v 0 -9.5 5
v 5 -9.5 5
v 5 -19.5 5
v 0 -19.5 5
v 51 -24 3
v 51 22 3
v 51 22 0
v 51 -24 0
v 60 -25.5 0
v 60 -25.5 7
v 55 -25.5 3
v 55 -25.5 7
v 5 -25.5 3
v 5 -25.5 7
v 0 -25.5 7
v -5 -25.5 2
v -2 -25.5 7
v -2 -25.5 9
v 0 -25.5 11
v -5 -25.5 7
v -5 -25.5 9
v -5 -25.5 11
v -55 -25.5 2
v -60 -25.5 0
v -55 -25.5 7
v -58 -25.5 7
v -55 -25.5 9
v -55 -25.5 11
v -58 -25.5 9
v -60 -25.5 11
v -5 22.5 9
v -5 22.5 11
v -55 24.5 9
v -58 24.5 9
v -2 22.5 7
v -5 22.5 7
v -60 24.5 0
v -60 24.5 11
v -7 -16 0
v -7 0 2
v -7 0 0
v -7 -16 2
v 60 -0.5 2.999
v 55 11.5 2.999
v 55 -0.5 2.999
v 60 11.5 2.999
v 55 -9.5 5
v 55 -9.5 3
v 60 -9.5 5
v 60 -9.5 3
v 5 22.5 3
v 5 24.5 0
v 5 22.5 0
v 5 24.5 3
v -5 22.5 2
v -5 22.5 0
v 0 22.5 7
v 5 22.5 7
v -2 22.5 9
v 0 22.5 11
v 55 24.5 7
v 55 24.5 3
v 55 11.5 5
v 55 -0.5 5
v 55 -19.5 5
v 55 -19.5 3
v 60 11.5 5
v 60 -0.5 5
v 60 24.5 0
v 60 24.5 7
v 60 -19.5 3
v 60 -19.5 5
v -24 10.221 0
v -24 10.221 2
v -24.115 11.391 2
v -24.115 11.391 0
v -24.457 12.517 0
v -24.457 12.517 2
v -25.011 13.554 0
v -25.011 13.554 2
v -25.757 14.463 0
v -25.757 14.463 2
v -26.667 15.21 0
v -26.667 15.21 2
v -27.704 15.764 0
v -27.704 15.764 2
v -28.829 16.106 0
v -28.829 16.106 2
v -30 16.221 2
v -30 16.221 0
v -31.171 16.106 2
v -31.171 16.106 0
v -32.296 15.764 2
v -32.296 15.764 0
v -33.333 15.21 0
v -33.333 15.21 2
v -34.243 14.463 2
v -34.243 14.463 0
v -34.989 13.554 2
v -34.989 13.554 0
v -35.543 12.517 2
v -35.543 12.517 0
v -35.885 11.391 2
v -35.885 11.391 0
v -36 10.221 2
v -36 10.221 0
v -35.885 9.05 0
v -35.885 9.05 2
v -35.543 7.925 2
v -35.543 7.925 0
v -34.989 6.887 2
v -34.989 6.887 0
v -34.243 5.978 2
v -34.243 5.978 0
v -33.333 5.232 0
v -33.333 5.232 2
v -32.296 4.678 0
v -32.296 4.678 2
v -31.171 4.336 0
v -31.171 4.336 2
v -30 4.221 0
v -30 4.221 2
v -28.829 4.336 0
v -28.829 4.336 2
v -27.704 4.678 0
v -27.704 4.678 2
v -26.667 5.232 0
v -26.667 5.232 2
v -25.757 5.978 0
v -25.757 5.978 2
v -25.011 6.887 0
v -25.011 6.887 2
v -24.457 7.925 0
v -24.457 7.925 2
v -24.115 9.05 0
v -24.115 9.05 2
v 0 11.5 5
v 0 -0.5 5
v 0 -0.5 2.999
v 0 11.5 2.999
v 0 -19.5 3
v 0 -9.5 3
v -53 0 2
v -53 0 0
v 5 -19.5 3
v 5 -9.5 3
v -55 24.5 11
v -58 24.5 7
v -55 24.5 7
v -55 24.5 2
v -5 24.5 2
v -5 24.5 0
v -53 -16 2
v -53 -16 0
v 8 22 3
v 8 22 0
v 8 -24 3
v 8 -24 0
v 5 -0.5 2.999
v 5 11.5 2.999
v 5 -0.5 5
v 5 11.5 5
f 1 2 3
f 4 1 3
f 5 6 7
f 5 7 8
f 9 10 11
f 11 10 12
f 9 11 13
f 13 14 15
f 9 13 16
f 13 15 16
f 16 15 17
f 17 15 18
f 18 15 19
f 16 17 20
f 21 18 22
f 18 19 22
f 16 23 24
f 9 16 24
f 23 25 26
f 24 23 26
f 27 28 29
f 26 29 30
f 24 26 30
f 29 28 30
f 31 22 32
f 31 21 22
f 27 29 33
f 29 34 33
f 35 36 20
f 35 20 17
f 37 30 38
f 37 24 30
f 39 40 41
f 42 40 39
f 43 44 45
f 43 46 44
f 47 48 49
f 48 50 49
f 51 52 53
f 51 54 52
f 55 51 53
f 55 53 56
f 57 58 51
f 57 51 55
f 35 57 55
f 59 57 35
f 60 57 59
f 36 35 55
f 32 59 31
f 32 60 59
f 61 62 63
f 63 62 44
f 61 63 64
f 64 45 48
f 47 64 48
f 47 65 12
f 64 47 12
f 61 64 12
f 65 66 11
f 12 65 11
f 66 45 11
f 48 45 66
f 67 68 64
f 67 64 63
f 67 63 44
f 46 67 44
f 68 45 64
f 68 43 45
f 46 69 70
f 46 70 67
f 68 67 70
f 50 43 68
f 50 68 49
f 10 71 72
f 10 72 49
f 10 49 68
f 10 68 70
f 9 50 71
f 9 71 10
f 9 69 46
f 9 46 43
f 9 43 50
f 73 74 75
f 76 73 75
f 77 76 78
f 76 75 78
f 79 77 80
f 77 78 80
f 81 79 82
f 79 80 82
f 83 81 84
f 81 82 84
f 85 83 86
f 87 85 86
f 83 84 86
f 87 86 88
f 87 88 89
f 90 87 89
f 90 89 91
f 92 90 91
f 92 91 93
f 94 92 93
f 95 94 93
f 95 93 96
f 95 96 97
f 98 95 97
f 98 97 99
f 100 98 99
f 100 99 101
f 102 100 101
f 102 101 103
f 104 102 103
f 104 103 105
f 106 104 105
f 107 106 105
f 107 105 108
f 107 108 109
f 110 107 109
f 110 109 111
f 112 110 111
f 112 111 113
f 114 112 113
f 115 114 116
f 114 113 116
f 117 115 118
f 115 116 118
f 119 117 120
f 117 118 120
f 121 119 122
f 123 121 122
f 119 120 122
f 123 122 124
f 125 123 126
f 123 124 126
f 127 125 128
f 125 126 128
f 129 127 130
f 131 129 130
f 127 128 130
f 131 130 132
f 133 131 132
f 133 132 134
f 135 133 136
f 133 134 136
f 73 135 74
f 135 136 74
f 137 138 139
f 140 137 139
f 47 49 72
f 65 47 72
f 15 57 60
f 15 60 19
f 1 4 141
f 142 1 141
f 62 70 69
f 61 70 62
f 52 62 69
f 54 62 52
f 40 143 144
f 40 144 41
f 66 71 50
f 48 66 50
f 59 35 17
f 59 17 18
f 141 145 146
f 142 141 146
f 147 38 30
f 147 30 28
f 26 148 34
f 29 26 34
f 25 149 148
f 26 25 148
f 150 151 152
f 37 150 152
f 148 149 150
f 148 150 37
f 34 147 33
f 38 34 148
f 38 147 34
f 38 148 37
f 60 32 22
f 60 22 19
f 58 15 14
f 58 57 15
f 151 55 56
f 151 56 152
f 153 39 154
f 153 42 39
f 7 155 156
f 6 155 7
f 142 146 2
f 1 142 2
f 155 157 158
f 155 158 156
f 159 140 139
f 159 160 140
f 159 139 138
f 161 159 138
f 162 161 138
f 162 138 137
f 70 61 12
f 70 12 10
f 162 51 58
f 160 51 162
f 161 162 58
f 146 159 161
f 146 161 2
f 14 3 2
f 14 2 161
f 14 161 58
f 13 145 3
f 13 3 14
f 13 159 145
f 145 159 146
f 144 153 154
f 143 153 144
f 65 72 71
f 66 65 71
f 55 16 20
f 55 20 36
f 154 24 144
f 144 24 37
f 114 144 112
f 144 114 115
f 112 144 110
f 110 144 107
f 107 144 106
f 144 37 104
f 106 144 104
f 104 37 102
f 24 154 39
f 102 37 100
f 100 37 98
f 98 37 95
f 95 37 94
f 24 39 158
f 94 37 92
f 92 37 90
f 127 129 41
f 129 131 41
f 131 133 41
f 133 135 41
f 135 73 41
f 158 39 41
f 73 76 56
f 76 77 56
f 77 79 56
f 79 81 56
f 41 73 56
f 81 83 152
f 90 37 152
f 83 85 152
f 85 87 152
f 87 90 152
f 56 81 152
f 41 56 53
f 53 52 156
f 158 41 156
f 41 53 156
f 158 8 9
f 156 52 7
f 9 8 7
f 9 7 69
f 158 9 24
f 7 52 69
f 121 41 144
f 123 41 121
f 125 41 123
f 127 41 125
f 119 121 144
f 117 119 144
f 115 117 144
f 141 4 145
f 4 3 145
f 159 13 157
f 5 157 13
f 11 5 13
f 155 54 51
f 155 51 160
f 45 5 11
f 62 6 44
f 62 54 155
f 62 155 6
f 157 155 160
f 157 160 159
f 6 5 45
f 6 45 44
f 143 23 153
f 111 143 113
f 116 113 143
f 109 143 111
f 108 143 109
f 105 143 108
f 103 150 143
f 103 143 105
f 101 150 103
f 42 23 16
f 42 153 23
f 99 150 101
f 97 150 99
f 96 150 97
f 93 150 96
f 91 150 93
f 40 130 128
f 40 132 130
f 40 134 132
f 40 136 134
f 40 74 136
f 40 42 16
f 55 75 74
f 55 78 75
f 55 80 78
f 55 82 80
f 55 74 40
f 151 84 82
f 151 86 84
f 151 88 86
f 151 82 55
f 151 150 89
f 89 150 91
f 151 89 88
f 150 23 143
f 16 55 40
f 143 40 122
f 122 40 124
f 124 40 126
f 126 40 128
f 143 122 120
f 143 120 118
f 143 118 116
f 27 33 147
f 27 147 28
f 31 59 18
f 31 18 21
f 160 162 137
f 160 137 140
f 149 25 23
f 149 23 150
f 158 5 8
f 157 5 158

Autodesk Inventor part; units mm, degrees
ref_plane "YZ Plane" through (0, 0, 0) normal (1, 0, 0) x (0, 1, 0)
ref_plane "XZ Plane" through (0, 0, 0) normal (0, 1, 0) x (-1, 0, 0)
ref_plane "XY Plane" through (0, 0, 0) normal (0, 0, 1) x (1, 0, 0)
sketch "Sketch1" plane through (0, 0, 0) normal (0, 0, 1) x (1, 0, 0)
  line L0 (-60, 27.5) -> (-4, 27.5) projected
  line L1 (-60, -27.5) -> (-60, 27.5) projected
  line L2 (60, 27.5) -> (60, -27.5) projected
  line L3 (60, -27.5) -> (-60, -27.5) projected
  line L4 (10, -17) -> (50, -17) projected
  line L5 (-10, -13) -> (-10, -3) projected
  line L6 (-10, -3) -> (-20, -3) projected
  line L7 (-20, -3) -> (-20, -13) projected
  line L8 (-20, -13) -> (-10, -13) projected
  line L9 (60, -27.5) -> (-60, -27.5) projected
  line L10 (60, 27.5) -> (60, -27.5) projected
  line L11 (4, 27.5) -> (60, 27.5) projected
  arc A0 (-4, 27.5) -> (4, 27.5) centre (0, 27.5) ccw projected
  line L12 (-60, 27.5) -> (-4, 27.5) projected
  line L13 (-60, -27.5) -> (-60, 27.5) projected
  circle A1 centre (-30, 10.2208) radius 3 projected
  line L14 (50, 17) -> (10, 17) projected
  line L15 (50, -17) -> (50, 17) projected
  line L16 (10, -17) -> (50, -17) projected
  line L17 (10, 17) -> (10, -17) projected
  line L18 (-40, -3) -> (-50, -3) projected
  line L19 (-40, -13) -> (-40, -3) projected
  line L20 (-50, -13) -> (-40, -13) projected
  line L21 (-50, -3) -> (-50, -13) projected
  line L22 (-25, -3) -> (-35, -3) projected
  line L23 (-25, -13) -> (-25, -3) projected
  line L24 (-35, -13) -> (-25, -13) projected
  line L25 (-35, -3) -> (-35, -13) projected
  line L26 (-10, -3) -> (-20, -3) projected
  line L27 (-10, -13) -> (-10, -3) projected
  line L28 (-20, -13) -> (-10, -13) projected
  line L29 (-20, -3) -> (-20, -13) projected
  line L30 (-35, -13) -> (-25, -13) projected
  line L31 (-35, -3) -> (-35, -13) projected
  circle A2 centre (-30, 10.2208) radius 3 projected
  line L32 (-60, 27.5) -> (60, 27.5)
  line L33 (60, 27.5) -> (60, -27.5)
  line L34 (60, -27.5) -> (-60, -27.5)
  line L35 (-60, -27.5) -> (-60, 27.5)
  line L36 (10, 17) -> (50, 17)
  line L37 (50, 17) -> (50, -17)
  line L38 (50, -17) -> (10, -17)
  line L39 (10, -17) -> (10, 17)
  line L40 (-50, -3) -> (-40, -3)
  line L41 (-40, -3) -> (-40, -13)
  line L42 (-40, -13) -> (-50, -13)
  line L43 (-50, -13) -> (-50, -3)
  line L44 (-35, -3) -> (-25, -3)
  line L45 (-25, -3) -> (-25, -13)
  line L46 (-25, -13) -> (-35, -13)
  line L47 (-35, -13) -> (-35, -3)
  line L48 (-20, -3) -> (-10, -3)
  line L49 (-10, -3) -> (-10, -13)
  line L50 (-10, -13) -> (-20, -13)
  line L51 (-20, -13) -> (-20, -3)
  circle A3 centre (-30, 10.2208) radius 3
  arc A4 (-4, 27.5) -> (4, 27.5) centre (0, 27.5) ccw
  point P0 (0, 0)
  dimension "d0" = 6
extrude "Extrusion1" add sketch "Sketch1" along normal blind 3 contours L0 A0 L11 L2 L3 L1
sketch "Sketch2" plane through (0, 0, 3) normal (0, 0, 1) x (1, 0, 0)
  line L0 (10, 17) -> (50, 17) projected
  line L1 (8, 22) -> (51, 22)
  line L2 (51, 22) -> (51, -24)
  line L3 (51, -24) -> (8, -24)
  line L4 (8, -24) -> (8, 22)
  line L5 (10, -17) -> (10, 17) projected
  line L6 (50, -17) -> (10, -17) projected
  line L7 (50, 17) -> (50, -17) projected
  circle A0 centre (-30, 10.2208) radius 3 projected
  circle A1 centre (-30, 10.2208) radius 6
  line L8 (-53, 0) -> (-7, 0)
  line L9 (-7, 0) -> (-7, -16)
  line L10 (-7, -16) -> (-53, -16)
  line L11 (-53, -16) -> (-53, 0)
  line L12 (-50, -13) -> (-50, -3) projected
  line L13 (-40, -13) -> (-50, -13) projected
  line L14 (-25, -13) -> (-35, -13) projected
  line L15 (-10, -3) -> (-10, -13) projected
  line L16 (-10, -13) -> (-20, -13) projected
  line L17 (-35, -3) -> (-25, -3) projected
  point P0 (0, 0)
  dimension "d4" = 5
  dimension "d5" = 2
  dimension "d6" = 7
  dimension "d7" = 1
  dimension "d10" = 12
  dimension "d11" = 3
  dimension "d12" = 3
  dimension "d13" = 3
  dimension "d14" = 3
extrude "Extrusion2" cut sketch "Sketch2" against normal blind 3
sketch "Sketch6" plane through (0, 0, 3) normal (0, 0, 1) x (1, 0, 0)
  line L0 (-60, 27.5) -> (-60, -27.5) projected
  line L1 (-60, -27.5) -> (60, -27.5) projected
  line L2 (-60, 27.5) -> (-55, 27.5)
  line L3 (-55, 27.5) -> (-55, -27.5)
  line L4 (-55, -27.5) -> (-60, -27.5)
  line L5 (-60, -27.5) -> (-60, 27.5)
  line L6 (-4, 27.5) -> (-60, 27.5) projected
  line L7 (0, -27.5) -> (-5, -27.5)
  line L8 (-5, -27.5) -> (-5, 27.5)
  line L9 (-5, 27.5) -> (0, 27.5)
  line L10 (0, 27.5) -> (0, -27.5)
  arc A0 (-4, 27.5) -> (4, 27.5) centre (0, 27.5) ccw projected
  point P0 (0, 0)
  point P1 (0, -27.5)
  point P2 (-5, -27.5)
  point P3 (0, 23.5)
  dimension "d23" = 5
  dimension "d24" = 5
extrude "Extrusion5" add sketch "Sketch6" along normal blind 8 contours L2 L3 L1 L0 | L6 A0 L10 L1 L8 | L9 L10 A0
sketch "Sketch7" plane through (-60, 27.5, 0) normal (0, 1, 0) x (1, 0, 0)
  line L0 (5, -3) -> (5, -11) construction
  line L1 (5, -3) -> (5, -7) construction
  line L2 (5, -7) -> (2, -7)
  line L3 (2, -7) -> (2, -9)
  line L4 (2, -9) -> (5, -9)
  line L5 (55, -3) -> (5, -3) projected
  line L6 (30, -3) -> (30, -9) construction
  line L7 (55, -3) -> (55, -11) construction
  line L8 (55, -3) -> (55, -7) construction
  line L9 (55, -7) -> (58, -7)
  line L10 (58, -7) -> (58, -9)
  line L11 (58, -9) -> (55, -9)
  line L12 (5, -7) -> (5, -9)
  line L13 (55, -7) -> (55, -9)
  point P0 (60, 0)
  dimension "d27" = 4
  dimension "d28" = 3
  dimension "d29" = 2
extrude "Extrusion6" cut sketch "Sketch7" against normal through all
sketch "Sketch10" plane through (0, 0, 3) normal (0, 0, 1) x (1, 0, 0)
  line L0 (-55, -27.5) -> (-55, 27.5) projected
  line L1 (-5, 27.5) -> (-5, -27.5) projected
  line L2 (-55, 27.5) -> (-5, 27.5)
  line L3 (-5, 27.5) -> (-5, -27.5)
  line L4 (-5, -27.5) -> (-55, -27.5)
  line L5 (-55, -27.5) -> (-55, 27.5)
  point P0 (0, 0)
extrude "Extrusion9" cut sketch "Sketch10" against normal blind 1
sketch "Sketch11" plane through (0, 0, 3) normal (0, 0, 1) x (1, 0, 0)
  line L0 (0, -27.5) -> (0, 27.5) projected
  line L1 (-60, -27.5) -> (60, -27.5) projected
  line L2 (0, 27.5) -> (5, 27.5)
  line L3 (5, 27.5) -> (5, -27.5)
  line L4 (5, -27.5) -> (0, -27.5)
  line L5 (0, -27.5) -> (0, 27.5)
  line L6 (60, -27.5) -> (60, 27.5) projected
  line L7 (60, 27.5) -> (55, 27.5)
  line L8 (55, 27.5) -> (55, -27.5)
  line L9 (55, -27.5) -> (60, -27.5)
  line L10 (60, -27.5) -> (60, 27.5)
  point P0 (0, 0)
  dimension "d43" = 5
  dimension "d44" = 5
extrude "Extrusion10" add sketch "Sketch11" along normal blind 4
sketch "Sketch14" plane through (60, -27.5, 0) normal (1, 0, 0) x (0, 0, -1)
  point P0 (0, 27.5)
sketch "Sketch15" plane through (60, -27.5, 0) normal (1, 0, 0) x (0, 0, -1)
  line L0 (-2, 55) -> (-2, 0) projected
  line L1 (-7, 0) -> (-2, 0) projected
  line L2 (-3.0003, 0.0005) -> (-3.0003, 18)
  line L3 (-2, 0) -> (-2, 55) projected
  line L4 (-3.0003, 18) -> (-5.0003, 18)
  line L5 (-5.0003, 18) -> (-5.0003, 8)
  line L6 (-5.0003, 8) -> (-3.0003, 8)
  line L7 (-2.9987, 54.9727) -> (-2.9987, 27)
  line L8 (-2.9987, 27) -> (-5.0003, 27)
  line L9 (-5.0003, 27) -> (-5.0003, 39)
  line L10 (-5.0003, 39) -> (-2.9987, 39)
  line L11 (-3, 0) -> (-3, 55) projected
  line L12 (0, 55) -> (-7, 55) projected
  point P0 (0, 27.5)
  point P1 (-2, 39)
  point P2 (-2, 8)
  point P3 (-2, 18)
  dimension "d65" = 2
  dimension "d66" = 10
  dimension "d68" = 12
  dimension "d71" = 28
  dimension "d72" = 18
extrude "Extrusion13" cut sketch "Sketch15" against normal up to surface (60 mm away) contours L6 L5 L4 L2 | L7 L8 L9 L10
sketch "Sketch16" plane through (0, 0, 11) normal (0, 0, 1) x (1, 0, 0)
  line L0 (-60, 27.5) -> (-60, -27.5) projected
  line L1 (60, -27.5) -> (60, 27.5) projected
  line L2 (-60, 27.5) -> (60, 27.5)
  line L3 (60, 27.5) -> (60, 24.5)
  line L4 (60, 24.5) -> (-60, 24.5)
  line L5 (-60, 24.5) -> (-60, 27.5)
  line L6 (-60, -27.5) -> (60, -27.5) projected
  line L7 (-60, -27.5) -> (60, -27.5)
  line L8 (60, -27.5) -> (60, -25.5)
  line L9 (60, -25.5) -> (-60, -25.5)
  line L10 (-60, -25.5) -> (-60, -27.5)
  line L11 (-55, 27.5) -> (-5, 27.5) projected
  line L12 (5, 27.5) -> (5, 11.5) projected
  line L13 (-5, 27.5) -> (5, 27.5)
  line L14 (5, 27.5) -> (5, 24.5)
  line L15 (5, 24.5) -> (-5, 24.5)
  line L16 (-5, 24.5) -> (-5, 27.5)
  line L17 (-5, 24.5) -> (5, 24.5)
  line L18 (5, 24.5) -> (5, 22.5)
  line L19 (5, 22.5) -> (-5, 22.5)
  line L20 (-5, 22.5) -> (-5, 24.5)
  point P0 (0, 0)
  point P1 (-60, -25.5)
  dimension "d74" = 3
  dimension "d77" = 2
  dimension "d78" = 2
extrude "Extrusion14" cut sketch "Sketch16" against normal through all contours L2 L16 L4 L0 | L9 L1 L6 L0 | L16 L2 L12 L4 | L4 L12 L19 L20 | L12 L2 L1 L4
properties part number "circuit clip_3DPrint"
